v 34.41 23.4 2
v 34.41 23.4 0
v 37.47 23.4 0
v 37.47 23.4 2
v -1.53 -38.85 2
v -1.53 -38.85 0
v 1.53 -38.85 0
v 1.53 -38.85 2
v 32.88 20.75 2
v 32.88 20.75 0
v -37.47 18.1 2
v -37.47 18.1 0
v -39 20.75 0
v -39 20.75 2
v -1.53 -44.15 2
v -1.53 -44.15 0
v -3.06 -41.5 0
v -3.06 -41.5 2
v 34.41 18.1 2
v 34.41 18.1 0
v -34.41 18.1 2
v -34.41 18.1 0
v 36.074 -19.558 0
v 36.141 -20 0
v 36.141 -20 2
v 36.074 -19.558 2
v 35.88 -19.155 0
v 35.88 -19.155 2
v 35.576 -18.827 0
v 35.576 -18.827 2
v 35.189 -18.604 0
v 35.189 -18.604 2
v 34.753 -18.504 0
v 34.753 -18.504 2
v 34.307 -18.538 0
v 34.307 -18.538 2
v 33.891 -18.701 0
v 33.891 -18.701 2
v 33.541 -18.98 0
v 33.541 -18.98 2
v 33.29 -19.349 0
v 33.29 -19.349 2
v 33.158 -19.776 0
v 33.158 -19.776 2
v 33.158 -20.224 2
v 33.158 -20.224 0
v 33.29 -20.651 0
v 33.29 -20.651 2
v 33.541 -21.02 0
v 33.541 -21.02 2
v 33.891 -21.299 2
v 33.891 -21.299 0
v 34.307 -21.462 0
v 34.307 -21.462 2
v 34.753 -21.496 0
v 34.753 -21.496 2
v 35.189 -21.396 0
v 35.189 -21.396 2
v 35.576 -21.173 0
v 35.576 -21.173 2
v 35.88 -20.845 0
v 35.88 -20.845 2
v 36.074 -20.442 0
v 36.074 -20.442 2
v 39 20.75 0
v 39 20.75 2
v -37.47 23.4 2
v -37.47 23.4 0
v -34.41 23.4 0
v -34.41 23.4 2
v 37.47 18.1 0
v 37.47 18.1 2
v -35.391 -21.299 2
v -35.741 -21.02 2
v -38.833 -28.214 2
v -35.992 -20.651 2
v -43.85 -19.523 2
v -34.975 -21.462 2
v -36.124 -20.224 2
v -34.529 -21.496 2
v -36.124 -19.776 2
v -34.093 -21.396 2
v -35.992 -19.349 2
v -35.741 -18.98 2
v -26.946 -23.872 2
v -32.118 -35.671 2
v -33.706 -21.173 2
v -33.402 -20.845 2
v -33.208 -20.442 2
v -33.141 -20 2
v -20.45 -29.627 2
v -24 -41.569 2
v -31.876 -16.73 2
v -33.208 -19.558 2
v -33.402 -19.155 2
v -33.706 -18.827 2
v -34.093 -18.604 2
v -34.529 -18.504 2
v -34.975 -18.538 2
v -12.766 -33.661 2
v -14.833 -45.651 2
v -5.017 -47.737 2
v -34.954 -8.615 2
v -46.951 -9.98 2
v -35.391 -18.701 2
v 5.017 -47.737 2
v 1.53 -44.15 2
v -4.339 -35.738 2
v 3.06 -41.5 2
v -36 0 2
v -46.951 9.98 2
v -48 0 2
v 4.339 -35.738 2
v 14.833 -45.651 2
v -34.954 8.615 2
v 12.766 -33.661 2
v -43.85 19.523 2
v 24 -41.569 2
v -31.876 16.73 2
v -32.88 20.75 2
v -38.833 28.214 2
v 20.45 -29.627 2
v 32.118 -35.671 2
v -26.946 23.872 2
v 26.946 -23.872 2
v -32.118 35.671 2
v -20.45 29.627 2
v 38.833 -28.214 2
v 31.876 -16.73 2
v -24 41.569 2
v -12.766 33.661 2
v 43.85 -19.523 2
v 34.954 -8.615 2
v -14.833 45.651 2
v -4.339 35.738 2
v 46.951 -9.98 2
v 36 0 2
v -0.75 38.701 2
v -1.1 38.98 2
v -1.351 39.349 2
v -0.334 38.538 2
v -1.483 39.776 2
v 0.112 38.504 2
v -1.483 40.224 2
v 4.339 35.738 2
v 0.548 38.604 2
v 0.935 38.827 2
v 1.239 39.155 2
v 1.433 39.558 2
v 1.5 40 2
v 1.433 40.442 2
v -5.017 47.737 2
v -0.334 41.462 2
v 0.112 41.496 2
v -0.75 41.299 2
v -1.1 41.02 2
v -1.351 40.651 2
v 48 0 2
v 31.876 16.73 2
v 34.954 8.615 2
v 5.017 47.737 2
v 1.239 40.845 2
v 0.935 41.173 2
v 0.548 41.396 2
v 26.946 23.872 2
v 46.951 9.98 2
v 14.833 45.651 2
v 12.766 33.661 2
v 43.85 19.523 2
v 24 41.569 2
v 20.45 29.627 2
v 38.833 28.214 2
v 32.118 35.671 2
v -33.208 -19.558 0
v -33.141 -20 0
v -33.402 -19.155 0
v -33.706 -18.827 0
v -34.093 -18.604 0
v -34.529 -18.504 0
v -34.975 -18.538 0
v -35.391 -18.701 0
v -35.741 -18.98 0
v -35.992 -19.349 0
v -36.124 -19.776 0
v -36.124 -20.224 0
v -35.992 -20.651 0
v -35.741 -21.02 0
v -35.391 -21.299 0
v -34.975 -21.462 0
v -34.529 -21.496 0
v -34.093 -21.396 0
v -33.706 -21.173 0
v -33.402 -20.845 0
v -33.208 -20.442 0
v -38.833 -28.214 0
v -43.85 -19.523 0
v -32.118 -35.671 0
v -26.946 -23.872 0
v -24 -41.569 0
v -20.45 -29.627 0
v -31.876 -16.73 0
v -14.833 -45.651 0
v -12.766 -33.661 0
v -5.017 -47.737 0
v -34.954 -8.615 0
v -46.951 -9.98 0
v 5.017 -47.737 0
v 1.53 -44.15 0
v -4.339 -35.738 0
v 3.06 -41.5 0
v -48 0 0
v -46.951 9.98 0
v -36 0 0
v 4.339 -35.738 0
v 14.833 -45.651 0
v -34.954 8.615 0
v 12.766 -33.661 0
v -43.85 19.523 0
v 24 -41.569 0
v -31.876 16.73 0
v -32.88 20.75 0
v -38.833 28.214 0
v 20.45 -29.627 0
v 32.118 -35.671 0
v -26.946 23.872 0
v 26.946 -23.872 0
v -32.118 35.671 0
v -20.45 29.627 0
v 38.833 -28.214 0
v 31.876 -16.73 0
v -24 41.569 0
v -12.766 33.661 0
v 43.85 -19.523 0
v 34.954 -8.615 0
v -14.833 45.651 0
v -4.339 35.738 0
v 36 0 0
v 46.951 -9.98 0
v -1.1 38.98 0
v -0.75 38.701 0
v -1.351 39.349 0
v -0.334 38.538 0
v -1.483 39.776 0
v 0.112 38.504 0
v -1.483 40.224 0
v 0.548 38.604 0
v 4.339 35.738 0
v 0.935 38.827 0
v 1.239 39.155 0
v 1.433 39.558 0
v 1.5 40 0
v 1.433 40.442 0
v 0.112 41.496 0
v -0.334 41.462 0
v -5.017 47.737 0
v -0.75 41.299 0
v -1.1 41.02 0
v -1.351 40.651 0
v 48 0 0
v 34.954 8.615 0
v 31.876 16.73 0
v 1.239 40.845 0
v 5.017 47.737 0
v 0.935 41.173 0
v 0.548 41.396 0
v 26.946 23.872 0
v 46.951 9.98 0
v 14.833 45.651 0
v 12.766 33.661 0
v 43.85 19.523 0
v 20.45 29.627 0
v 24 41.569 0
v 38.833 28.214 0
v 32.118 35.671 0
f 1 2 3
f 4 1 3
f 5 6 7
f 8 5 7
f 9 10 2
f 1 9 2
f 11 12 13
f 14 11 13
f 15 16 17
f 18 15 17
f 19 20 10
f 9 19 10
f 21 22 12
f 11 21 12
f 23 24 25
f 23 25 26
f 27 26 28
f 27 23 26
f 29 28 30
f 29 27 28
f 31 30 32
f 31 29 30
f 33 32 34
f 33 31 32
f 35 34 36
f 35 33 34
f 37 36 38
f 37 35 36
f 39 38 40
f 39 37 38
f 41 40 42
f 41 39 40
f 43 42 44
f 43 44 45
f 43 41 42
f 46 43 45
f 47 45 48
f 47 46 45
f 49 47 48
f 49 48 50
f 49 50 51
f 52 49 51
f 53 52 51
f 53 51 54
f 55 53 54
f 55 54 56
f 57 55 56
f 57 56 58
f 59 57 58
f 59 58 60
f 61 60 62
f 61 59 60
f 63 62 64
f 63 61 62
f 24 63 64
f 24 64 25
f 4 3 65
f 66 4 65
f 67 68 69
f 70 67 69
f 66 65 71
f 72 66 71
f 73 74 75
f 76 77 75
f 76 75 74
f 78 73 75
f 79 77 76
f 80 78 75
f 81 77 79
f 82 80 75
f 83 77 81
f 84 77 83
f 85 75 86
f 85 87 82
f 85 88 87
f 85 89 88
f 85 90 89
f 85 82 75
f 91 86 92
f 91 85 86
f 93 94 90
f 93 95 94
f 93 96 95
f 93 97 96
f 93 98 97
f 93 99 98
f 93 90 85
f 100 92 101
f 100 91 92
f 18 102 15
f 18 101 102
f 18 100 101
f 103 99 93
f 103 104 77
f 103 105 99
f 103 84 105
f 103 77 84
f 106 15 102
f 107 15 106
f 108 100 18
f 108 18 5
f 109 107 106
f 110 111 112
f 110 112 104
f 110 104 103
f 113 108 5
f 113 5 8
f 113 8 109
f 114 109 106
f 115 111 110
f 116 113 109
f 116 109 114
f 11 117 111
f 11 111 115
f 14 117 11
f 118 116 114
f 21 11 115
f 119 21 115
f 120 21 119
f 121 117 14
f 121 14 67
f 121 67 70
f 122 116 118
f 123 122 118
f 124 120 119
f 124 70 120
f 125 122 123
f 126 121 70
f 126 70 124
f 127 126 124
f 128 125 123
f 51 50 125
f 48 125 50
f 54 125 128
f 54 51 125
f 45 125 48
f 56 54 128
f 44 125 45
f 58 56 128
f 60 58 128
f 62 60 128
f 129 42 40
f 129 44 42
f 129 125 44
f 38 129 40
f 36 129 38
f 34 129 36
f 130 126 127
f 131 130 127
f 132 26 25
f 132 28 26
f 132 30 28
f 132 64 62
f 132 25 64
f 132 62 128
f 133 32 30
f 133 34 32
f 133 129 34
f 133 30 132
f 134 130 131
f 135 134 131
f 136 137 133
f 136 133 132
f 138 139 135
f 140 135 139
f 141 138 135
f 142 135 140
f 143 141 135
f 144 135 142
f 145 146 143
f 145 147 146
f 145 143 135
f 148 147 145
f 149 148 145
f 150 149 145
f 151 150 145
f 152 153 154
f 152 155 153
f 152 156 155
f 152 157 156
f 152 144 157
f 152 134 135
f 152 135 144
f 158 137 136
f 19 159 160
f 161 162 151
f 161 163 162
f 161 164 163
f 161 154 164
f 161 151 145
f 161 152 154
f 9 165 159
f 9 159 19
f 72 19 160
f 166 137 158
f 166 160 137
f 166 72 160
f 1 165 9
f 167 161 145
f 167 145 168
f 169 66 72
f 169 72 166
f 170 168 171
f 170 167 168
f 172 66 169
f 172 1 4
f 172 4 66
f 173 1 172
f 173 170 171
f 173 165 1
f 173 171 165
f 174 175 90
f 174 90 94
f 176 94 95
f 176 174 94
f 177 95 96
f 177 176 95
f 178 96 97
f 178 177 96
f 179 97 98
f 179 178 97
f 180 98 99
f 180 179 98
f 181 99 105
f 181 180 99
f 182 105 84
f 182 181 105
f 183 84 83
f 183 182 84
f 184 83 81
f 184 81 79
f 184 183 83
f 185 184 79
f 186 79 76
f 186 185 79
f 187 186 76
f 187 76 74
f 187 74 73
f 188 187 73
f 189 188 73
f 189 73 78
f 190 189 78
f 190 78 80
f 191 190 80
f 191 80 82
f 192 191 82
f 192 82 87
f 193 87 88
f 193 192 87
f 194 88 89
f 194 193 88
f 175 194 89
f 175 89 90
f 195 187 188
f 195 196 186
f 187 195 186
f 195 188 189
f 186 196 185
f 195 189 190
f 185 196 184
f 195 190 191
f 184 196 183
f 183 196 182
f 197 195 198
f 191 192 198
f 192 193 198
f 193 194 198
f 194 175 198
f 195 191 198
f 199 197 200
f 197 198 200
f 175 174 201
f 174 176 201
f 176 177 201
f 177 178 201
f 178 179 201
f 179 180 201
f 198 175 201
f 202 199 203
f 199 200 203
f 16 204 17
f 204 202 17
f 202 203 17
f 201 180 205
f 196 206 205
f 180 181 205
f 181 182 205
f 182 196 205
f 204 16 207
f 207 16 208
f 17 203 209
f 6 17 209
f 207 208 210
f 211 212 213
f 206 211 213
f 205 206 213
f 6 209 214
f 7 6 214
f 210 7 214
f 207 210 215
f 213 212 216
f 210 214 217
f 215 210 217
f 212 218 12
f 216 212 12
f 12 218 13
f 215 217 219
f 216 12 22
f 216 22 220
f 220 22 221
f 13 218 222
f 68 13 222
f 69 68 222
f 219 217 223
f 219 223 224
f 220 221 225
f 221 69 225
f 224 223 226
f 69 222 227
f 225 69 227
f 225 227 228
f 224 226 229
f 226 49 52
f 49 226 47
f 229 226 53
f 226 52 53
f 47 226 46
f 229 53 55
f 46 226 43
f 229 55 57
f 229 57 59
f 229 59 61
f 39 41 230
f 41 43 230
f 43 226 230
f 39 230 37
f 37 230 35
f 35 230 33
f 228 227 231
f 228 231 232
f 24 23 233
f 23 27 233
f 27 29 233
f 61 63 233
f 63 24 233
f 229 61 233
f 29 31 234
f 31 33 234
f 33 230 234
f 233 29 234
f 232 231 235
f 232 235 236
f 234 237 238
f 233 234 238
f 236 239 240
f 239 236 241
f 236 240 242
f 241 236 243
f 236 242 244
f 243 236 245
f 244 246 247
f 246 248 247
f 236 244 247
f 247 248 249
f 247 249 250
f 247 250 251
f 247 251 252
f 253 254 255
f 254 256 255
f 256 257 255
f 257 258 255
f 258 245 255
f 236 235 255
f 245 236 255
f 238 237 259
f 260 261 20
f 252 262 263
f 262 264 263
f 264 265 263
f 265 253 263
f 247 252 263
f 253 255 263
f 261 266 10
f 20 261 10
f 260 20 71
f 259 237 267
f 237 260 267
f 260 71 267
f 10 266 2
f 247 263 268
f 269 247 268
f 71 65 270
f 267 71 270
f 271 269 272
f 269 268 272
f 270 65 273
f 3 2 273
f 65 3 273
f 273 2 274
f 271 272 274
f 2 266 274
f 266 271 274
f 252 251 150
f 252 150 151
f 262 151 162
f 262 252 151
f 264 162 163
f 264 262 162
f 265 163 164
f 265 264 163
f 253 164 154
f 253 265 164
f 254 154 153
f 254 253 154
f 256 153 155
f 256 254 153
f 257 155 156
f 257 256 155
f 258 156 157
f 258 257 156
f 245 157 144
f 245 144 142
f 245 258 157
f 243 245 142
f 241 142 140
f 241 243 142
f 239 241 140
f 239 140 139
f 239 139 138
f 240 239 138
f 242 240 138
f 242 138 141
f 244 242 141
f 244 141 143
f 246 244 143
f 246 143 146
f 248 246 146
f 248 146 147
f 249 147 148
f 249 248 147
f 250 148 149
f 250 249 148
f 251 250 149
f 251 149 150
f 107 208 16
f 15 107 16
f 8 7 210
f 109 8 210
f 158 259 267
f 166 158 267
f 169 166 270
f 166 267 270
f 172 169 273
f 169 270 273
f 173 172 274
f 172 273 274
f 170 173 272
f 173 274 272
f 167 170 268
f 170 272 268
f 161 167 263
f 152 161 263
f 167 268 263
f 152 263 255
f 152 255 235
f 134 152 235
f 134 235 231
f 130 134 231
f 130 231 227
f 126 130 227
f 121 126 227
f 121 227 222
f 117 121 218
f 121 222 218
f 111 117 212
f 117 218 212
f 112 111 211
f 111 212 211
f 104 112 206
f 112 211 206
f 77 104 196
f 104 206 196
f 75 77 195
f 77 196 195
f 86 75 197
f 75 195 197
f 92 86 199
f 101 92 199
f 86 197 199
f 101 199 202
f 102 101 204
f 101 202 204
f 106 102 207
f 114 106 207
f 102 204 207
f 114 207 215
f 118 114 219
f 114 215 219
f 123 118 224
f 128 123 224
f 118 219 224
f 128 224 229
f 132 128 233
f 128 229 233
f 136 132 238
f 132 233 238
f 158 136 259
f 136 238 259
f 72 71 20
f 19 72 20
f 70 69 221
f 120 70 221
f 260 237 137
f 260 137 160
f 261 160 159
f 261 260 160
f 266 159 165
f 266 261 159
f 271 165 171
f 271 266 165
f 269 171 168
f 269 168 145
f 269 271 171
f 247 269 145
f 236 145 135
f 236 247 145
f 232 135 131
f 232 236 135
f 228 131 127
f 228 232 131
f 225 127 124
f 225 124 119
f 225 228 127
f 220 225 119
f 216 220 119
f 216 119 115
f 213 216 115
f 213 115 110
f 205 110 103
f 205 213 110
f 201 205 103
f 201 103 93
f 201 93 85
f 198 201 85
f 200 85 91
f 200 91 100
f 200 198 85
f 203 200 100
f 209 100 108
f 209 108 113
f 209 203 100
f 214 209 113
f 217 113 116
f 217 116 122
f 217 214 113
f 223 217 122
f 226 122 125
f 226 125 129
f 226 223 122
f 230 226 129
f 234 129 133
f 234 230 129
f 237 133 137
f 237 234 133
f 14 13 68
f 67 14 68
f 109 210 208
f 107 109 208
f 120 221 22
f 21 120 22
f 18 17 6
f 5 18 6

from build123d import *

# Parameters (mm, degrees)
F0_R     = 48
F0_R_2   = 1.5
F0_R_3   = 36
F1_DEPTH = 2


with BuildPart() as f1:
    # F0 (on Top) → F1 (new body)
    with BuildSketch(Plane.XY):
        Circle(F0_R)
        Polygon((-3.059956, -41.5), (-1.529978, -38.85), (1.529978, -38.85), (3.059956, -41.5), (1.529978, -44.15), (-1.529978, -44.15), align=None, mode=Mode.SUBTRACT)
        with Locations((-34.641016, -20)):
            Circle(F0_R_2, mode=Mode.SUBTRACT)
        with Locations((34.641016, -20)):
            Circle(F0_R_2, mode=Mode.SUBTRACT)
        Polygon((-32.880098, 20.75), (-34.410076, 18.1), (-37.470032, 18.1), (-39.000011, 20.75), (-37.470032, 23.4), (-34.410076, 23.4), align=None, mode=Mode.SUBTRACT)
        Circle(F0_R_3, mode=Mode.SUBTRACT)
        Polygon((34.410076, 18.1), (32.880098, 20.75), (34.410076, 23.4), (37.470032, 23.4), (39.000011, 20.75), (37.470032, 18.1), align=None, mode=Mode.SUBTRACT)
        with Locations((0, 40)):
            Circle(F0_R_2, mode=Mode.SUBTRACT)
    extrude(amount=F1_DEPTH)


solid = f1.part
